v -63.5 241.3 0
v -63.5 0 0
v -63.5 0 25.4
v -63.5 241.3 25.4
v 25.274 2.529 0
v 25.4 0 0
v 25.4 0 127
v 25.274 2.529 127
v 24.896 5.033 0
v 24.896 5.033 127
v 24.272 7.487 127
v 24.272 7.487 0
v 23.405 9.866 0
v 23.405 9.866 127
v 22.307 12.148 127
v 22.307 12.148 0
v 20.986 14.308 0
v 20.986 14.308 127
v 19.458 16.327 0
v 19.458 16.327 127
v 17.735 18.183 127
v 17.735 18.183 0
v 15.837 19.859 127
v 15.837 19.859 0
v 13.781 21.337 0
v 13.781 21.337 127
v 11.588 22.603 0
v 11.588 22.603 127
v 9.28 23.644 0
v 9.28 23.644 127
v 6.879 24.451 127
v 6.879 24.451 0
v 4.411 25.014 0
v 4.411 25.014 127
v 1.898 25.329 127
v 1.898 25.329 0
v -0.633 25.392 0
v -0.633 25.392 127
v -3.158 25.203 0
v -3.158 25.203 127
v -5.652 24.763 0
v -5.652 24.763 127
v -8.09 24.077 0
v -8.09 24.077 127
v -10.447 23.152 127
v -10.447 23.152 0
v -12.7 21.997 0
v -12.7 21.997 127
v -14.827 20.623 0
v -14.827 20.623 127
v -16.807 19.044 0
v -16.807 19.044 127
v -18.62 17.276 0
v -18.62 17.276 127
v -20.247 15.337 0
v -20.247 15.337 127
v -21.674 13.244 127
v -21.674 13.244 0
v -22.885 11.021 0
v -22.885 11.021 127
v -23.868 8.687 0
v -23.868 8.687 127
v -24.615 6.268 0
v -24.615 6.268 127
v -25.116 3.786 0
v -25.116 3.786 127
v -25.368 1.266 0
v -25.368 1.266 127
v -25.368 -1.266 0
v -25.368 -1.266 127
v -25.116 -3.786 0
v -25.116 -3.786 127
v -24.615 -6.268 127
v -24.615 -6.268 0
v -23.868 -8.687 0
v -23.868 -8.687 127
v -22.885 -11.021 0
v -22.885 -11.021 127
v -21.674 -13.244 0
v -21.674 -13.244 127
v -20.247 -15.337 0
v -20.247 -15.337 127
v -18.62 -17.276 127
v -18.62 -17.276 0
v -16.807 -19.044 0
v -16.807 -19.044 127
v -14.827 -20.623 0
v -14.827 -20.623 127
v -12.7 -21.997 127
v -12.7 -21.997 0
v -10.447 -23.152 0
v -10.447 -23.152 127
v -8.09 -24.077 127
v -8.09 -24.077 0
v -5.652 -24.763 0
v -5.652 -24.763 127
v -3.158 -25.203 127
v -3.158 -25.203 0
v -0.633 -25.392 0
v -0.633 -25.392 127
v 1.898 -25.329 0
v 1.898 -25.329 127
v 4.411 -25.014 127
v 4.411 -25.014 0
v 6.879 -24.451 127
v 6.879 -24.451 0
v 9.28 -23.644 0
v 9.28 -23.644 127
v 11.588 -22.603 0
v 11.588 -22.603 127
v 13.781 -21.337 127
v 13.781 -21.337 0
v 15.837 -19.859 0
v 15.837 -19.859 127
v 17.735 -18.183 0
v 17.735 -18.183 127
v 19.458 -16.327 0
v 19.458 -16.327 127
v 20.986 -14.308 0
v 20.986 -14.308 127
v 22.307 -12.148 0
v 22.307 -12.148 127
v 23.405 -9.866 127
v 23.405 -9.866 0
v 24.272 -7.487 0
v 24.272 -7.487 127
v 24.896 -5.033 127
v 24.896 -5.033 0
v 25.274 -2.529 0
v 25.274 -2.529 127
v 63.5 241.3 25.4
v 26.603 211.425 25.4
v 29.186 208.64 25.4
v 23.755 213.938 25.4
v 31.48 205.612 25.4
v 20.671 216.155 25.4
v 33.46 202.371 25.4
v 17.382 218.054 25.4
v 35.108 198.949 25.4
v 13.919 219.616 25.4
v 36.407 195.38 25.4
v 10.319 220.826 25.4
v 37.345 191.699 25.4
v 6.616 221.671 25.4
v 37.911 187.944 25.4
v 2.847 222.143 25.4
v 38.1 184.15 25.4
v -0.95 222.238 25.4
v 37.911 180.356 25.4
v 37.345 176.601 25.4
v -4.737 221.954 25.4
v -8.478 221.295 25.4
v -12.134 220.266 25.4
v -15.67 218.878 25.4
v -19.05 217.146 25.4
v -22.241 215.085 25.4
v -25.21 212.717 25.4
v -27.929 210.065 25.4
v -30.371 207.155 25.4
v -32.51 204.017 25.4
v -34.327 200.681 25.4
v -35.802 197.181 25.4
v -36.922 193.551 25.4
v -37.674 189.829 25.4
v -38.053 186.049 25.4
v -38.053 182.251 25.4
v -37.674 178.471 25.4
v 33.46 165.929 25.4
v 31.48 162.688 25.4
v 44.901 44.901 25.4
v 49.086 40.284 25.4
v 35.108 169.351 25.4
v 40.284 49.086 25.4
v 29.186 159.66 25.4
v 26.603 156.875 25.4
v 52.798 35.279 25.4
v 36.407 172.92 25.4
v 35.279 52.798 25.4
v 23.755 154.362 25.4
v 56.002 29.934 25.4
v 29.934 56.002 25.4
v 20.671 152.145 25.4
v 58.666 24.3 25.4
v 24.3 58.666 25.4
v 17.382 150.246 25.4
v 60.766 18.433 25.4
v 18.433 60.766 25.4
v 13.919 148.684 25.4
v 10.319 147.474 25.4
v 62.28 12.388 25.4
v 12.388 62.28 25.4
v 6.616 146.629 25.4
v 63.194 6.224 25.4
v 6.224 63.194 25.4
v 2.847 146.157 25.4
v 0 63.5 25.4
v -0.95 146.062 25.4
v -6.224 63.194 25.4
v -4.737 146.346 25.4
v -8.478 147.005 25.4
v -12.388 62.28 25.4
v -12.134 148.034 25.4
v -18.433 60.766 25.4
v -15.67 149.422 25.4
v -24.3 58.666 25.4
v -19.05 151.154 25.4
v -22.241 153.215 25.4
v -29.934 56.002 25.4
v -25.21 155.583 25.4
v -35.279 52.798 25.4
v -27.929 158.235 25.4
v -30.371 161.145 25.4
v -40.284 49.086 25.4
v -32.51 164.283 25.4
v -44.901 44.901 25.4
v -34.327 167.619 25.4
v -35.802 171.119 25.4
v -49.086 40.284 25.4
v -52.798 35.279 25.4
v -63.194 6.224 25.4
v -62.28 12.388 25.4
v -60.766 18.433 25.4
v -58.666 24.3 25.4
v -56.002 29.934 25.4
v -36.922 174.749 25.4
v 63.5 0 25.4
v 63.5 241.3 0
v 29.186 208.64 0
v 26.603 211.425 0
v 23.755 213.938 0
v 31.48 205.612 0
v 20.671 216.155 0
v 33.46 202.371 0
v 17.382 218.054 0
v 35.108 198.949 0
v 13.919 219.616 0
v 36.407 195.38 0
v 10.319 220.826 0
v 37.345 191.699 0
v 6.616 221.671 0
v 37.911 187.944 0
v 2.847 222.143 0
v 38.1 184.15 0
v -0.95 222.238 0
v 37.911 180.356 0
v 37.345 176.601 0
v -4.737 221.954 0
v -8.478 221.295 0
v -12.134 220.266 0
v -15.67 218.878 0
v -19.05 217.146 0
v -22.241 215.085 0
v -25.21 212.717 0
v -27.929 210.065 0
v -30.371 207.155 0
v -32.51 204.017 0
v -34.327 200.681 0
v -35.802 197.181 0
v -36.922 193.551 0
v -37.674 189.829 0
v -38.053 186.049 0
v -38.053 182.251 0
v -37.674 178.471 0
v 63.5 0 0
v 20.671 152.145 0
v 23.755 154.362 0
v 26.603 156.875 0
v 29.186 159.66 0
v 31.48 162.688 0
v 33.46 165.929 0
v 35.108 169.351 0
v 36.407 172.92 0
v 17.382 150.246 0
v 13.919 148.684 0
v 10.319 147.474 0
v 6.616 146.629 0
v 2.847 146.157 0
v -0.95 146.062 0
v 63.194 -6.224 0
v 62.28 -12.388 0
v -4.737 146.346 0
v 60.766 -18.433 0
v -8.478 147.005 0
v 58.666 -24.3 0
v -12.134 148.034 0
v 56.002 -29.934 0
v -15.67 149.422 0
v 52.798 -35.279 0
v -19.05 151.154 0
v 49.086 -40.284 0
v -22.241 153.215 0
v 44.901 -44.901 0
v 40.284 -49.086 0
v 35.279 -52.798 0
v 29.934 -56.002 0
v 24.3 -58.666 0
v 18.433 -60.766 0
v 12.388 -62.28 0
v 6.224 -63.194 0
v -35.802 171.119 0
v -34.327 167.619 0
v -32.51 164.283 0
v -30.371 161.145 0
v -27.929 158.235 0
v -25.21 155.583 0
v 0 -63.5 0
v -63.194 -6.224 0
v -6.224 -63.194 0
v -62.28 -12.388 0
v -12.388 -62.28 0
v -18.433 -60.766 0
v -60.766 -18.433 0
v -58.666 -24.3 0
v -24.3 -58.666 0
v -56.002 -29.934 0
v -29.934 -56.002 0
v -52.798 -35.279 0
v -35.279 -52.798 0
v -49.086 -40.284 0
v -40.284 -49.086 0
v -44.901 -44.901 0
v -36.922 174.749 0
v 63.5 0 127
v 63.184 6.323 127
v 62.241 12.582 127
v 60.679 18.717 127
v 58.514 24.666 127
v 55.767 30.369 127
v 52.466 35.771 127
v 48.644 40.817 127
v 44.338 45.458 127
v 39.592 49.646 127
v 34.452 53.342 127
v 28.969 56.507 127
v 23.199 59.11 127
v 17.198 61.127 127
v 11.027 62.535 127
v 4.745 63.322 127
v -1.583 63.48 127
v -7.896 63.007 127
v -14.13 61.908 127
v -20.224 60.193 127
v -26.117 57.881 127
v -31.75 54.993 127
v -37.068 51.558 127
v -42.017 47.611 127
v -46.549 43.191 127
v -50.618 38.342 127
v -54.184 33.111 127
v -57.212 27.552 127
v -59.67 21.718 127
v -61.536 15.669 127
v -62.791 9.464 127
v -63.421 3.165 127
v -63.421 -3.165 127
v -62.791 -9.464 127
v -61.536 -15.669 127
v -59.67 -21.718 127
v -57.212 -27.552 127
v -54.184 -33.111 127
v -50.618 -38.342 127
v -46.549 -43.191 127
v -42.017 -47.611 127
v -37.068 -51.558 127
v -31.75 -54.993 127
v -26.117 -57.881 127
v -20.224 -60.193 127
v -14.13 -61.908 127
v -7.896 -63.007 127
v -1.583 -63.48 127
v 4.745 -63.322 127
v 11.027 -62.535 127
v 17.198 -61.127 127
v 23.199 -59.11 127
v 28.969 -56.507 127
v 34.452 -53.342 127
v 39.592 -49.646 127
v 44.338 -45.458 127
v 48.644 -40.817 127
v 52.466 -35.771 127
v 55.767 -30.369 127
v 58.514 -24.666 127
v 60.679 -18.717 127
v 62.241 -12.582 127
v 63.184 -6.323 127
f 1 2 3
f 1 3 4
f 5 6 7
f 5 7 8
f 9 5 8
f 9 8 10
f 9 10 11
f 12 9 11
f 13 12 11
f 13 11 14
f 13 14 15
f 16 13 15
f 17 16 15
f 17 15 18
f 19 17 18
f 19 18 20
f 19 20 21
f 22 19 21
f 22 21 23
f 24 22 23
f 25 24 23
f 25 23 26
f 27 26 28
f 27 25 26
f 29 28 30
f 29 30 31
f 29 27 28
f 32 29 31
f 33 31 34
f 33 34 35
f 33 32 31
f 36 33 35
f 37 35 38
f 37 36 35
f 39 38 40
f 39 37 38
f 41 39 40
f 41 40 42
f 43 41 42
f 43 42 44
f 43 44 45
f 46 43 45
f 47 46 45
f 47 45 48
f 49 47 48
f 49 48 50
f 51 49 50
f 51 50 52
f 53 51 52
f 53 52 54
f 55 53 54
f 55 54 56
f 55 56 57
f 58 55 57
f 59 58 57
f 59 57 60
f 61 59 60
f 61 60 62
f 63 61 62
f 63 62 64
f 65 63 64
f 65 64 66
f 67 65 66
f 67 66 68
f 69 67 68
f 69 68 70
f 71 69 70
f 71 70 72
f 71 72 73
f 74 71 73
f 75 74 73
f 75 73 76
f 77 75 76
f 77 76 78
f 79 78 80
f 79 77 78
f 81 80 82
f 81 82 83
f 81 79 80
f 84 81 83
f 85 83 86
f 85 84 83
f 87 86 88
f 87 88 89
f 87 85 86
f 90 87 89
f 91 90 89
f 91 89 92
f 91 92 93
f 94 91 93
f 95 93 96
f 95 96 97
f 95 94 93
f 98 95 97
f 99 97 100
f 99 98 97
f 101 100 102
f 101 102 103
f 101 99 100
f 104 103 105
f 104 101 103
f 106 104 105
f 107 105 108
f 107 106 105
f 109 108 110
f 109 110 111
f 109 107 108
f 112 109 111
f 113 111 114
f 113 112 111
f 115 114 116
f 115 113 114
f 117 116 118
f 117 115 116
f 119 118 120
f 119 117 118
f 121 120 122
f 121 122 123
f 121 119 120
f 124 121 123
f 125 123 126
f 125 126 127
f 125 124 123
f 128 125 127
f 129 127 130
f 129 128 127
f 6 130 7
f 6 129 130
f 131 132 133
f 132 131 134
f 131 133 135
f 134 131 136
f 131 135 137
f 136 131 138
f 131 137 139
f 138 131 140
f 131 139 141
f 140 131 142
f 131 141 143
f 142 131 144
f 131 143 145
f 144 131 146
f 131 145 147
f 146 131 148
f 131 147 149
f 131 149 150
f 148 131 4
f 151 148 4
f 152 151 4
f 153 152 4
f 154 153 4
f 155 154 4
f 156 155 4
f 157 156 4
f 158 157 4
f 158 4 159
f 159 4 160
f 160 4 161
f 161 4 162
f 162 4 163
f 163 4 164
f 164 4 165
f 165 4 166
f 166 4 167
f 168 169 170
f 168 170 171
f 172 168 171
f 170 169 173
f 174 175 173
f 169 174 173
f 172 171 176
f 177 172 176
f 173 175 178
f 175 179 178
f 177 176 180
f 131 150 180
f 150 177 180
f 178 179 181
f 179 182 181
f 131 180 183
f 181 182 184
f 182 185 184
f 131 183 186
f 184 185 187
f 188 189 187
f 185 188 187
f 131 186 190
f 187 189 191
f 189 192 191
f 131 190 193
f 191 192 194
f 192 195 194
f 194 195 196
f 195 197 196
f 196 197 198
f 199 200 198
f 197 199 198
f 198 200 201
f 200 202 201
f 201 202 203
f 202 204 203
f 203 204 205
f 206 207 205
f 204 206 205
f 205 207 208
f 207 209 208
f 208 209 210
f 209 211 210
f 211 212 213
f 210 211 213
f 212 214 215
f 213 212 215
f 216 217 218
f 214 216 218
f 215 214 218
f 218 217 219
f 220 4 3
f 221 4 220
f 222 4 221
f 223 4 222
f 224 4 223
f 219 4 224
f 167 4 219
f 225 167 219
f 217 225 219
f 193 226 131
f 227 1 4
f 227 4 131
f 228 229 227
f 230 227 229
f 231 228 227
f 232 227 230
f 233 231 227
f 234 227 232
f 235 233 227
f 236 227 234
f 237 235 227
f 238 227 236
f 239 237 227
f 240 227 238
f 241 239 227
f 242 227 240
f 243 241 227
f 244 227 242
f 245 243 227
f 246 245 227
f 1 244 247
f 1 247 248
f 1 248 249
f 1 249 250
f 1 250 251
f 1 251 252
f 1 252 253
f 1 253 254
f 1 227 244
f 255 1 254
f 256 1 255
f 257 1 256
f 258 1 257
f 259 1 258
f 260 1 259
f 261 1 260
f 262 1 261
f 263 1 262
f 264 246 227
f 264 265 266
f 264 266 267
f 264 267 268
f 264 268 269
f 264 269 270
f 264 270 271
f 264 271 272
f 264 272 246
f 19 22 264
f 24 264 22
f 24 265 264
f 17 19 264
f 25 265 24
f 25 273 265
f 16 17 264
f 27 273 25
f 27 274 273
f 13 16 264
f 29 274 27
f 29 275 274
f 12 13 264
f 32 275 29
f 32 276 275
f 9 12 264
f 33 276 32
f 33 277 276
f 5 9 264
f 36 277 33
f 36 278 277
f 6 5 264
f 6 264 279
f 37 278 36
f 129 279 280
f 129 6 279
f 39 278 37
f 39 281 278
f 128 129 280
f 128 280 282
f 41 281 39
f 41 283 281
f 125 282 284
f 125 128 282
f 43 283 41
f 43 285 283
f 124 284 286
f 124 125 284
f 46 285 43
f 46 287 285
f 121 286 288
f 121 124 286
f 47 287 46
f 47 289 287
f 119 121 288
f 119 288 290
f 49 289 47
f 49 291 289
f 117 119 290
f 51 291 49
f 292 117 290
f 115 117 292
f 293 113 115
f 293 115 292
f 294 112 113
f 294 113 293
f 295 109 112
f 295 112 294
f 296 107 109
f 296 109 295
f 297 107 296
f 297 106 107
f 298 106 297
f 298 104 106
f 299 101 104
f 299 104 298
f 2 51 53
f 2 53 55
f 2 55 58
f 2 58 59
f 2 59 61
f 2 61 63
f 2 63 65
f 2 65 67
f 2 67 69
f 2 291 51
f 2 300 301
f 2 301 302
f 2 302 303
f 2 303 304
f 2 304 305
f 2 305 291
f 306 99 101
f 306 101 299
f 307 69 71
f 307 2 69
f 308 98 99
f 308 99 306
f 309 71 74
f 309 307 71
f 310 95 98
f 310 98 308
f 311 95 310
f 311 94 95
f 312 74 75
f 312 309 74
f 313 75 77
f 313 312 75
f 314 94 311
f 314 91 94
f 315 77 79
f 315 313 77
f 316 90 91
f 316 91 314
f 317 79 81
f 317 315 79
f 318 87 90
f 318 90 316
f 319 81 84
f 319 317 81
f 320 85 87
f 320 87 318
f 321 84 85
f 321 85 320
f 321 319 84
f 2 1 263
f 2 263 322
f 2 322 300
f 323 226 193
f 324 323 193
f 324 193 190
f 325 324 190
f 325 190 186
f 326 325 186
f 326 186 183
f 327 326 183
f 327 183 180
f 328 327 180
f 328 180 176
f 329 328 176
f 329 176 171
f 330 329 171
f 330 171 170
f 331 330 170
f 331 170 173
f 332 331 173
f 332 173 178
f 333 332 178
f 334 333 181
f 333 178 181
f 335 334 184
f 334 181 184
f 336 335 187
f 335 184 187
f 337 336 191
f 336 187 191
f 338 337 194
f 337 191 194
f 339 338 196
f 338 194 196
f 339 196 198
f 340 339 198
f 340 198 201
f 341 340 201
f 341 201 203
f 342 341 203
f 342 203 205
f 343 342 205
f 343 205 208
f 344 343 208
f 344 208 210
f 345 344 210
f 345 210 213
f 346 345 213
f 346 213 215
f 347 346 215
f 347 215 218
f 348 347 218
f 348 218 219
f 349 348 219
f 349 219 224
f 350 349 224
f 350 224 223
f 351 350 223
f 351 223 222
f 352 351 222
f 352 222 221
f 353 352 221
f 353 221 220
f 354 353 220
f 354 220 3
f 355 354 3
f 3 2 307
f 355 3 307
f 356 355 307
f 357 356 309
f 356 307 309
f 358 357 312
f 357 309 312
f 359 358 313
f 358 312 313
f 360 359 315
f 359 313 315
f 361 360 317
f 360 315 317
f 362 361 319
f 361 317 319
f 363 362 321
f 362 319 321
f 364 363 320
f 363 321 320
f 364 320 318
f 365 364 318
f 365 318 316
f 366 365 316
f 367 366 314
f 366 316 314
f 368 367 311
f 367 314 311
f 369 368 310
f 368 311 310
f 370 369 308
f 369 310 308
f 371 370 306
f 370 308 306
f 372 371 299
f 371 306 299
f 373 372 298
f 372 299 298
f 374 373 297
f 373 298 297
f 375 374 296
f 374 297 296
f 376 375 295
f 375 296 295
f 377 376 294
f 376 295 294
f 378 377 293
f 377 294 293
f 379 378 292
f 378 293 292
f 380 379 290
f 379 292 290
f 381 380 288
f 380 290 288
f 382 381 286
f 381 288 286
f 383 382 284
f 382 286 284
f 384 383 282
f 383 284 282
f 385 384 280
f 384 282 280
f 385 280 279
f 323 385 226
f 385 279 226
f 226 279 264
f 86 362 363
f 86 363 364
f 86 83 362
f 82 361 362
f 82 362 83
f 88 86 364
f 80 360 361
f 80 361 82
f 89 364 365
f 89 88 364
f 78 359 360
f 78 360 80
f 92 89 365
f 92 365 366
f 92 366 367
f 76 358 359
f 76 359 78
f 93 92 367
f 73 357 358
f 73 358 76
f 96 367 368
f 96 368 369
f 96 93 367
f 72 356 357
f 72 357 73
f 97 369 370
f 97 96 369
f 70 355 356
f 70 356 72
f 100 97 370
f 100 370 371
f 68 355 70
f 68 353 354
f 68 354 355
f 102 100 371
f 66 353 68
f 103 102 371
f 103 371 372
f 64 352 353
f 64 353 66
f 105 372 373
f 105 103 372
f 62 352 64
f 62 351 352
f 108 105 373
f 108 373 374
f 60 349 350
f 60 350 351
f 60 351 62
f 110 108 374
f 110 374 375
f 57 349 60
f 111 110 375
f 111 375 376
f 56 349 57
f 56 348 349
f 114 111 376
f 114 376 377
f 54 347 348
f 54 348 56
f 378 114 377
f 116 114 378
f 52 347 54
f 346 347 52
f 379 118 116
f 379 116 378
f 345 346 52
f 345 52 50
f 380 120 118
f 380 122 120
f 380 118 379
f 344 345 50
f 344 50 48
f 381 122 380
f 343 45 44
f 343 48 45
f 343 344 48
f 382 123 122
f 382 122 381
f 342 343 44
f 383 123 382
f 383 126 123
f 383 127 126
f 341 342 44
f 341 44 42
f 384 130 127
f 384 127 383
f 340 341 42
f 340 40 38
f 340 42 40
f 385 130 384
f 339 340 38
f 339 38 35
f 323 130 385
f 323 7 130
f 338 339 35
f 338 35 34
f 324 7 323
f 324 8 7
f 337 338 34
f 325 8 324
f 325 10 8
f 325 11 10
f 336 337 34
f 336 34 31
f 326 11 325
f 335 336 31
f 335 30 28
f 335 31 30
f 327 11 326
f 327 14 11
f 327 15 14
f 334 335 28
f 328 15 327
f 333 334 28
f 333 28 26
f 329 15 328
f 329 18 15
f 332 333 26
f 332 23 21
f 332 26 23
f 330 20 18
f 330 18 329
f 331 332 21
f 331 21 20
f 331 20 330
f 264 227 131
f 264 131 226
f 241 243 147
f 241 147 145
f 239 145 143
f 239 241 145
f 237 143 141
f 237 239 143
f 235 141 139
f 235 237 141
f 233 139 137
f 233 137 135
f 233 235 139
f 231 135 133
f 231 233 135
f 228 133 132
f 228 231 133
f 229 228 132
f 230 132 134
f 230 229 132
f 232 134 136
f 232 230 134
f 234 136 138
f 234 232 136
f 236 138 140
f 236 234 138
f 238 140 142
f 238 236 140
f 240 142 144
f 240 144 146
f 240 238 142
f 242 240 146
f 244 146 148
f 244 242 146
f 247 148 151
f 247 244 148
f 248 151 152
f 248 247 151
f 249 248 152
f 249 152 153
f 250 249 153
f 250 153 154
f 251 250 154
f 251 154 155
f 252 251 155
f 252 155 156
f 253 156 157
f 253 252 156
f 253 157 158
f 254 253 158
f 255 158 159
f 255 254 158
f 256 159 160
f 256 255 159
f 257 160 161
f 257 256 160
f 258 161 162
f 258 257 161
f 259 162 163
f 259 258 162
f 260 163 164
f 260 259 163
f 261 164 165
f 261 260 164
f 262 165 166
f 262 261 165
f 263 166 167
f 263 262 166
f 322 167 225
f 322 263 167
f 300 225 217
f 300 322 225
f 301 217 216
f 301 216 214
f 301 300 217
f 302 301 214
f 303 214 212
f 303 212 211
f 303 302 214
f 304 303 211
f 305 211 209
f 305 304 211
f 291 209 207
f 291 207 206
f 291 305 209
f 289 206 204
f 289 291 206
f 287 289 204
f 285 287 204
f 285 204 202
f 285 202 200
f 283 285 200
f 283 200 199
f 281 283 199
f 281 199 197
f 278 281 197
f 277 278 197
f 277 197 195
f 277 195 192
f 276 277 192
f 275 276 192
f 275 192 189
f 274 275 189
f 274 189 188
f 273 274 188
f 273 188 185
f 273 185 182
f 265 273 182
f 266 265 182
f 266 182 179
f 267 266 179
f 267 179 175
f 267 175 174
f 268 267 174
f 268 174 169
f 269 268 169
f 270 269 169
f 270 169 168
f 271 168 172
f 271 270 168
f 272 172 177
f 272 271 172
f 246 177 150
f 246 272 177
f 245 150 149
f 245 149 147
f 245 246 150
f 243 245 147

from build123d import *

# Parameters (mm, degrees)
SKETCH3_R           = 63.5
SKETCH3_R_2         = 25.4
BOSS_EXTRUDE1_DEPTH = 127
SKETCH4_R           = 25.4
SKETCH4_R_2         = 38.1
BOSS_EXTRUDE2_DEPTH = 25.4


with BuildPart() as part:
    # Sketch3 → Boss-Extrude1 (new body)
    with BuildSketch(Plane(origin=(0, 0, 0), x_dir=(0, 1, 0), z_dir=(0, 0, 1))):
        with Locations(Location((0, 0, 0), (0, 0, 270))):
            Circle(SKETCH3_R)
        with Locations(Location((0, 0, 0), (0, 0, 270))):
            Circle(SKETCH3_R_2, mode=Mode.SUBTRACT)
    extrude(amount=BOSS_EXTRUDE1_DEPTH)

    # Sketch4 → Boss-Extrude2 (add)
    with BuildSketch(Plane(origin=(0, 0, 0), x_dir=(0, 1, 0), z_dir=(0, 0, 1))):
        with BuildLine():
            Line((0, 63.5), (241.3, 63.5))
            Line((241.3, 63.5), (241.3, -63.5))
            Line((241.3, -63.5), (0, -63.5))
            ThreePointArc((0, -63.5), (-63.5, 0), (0, 63.5))
        make_face()
        with Locations(Location((0, 0, 0), (0, 0, 270))):
            Circle(SKETCH4_R, mode=Mode.SUBTRACT)
        with Locations(Location((184.15, 0, 0), (0, 0, 270))):
            Circle(SKETCH4_R_2, mode=Mode.SUBTRACT)
    extrude(amount=BOSS_EXTRUDE2_DEPTH)


solid = part.part
